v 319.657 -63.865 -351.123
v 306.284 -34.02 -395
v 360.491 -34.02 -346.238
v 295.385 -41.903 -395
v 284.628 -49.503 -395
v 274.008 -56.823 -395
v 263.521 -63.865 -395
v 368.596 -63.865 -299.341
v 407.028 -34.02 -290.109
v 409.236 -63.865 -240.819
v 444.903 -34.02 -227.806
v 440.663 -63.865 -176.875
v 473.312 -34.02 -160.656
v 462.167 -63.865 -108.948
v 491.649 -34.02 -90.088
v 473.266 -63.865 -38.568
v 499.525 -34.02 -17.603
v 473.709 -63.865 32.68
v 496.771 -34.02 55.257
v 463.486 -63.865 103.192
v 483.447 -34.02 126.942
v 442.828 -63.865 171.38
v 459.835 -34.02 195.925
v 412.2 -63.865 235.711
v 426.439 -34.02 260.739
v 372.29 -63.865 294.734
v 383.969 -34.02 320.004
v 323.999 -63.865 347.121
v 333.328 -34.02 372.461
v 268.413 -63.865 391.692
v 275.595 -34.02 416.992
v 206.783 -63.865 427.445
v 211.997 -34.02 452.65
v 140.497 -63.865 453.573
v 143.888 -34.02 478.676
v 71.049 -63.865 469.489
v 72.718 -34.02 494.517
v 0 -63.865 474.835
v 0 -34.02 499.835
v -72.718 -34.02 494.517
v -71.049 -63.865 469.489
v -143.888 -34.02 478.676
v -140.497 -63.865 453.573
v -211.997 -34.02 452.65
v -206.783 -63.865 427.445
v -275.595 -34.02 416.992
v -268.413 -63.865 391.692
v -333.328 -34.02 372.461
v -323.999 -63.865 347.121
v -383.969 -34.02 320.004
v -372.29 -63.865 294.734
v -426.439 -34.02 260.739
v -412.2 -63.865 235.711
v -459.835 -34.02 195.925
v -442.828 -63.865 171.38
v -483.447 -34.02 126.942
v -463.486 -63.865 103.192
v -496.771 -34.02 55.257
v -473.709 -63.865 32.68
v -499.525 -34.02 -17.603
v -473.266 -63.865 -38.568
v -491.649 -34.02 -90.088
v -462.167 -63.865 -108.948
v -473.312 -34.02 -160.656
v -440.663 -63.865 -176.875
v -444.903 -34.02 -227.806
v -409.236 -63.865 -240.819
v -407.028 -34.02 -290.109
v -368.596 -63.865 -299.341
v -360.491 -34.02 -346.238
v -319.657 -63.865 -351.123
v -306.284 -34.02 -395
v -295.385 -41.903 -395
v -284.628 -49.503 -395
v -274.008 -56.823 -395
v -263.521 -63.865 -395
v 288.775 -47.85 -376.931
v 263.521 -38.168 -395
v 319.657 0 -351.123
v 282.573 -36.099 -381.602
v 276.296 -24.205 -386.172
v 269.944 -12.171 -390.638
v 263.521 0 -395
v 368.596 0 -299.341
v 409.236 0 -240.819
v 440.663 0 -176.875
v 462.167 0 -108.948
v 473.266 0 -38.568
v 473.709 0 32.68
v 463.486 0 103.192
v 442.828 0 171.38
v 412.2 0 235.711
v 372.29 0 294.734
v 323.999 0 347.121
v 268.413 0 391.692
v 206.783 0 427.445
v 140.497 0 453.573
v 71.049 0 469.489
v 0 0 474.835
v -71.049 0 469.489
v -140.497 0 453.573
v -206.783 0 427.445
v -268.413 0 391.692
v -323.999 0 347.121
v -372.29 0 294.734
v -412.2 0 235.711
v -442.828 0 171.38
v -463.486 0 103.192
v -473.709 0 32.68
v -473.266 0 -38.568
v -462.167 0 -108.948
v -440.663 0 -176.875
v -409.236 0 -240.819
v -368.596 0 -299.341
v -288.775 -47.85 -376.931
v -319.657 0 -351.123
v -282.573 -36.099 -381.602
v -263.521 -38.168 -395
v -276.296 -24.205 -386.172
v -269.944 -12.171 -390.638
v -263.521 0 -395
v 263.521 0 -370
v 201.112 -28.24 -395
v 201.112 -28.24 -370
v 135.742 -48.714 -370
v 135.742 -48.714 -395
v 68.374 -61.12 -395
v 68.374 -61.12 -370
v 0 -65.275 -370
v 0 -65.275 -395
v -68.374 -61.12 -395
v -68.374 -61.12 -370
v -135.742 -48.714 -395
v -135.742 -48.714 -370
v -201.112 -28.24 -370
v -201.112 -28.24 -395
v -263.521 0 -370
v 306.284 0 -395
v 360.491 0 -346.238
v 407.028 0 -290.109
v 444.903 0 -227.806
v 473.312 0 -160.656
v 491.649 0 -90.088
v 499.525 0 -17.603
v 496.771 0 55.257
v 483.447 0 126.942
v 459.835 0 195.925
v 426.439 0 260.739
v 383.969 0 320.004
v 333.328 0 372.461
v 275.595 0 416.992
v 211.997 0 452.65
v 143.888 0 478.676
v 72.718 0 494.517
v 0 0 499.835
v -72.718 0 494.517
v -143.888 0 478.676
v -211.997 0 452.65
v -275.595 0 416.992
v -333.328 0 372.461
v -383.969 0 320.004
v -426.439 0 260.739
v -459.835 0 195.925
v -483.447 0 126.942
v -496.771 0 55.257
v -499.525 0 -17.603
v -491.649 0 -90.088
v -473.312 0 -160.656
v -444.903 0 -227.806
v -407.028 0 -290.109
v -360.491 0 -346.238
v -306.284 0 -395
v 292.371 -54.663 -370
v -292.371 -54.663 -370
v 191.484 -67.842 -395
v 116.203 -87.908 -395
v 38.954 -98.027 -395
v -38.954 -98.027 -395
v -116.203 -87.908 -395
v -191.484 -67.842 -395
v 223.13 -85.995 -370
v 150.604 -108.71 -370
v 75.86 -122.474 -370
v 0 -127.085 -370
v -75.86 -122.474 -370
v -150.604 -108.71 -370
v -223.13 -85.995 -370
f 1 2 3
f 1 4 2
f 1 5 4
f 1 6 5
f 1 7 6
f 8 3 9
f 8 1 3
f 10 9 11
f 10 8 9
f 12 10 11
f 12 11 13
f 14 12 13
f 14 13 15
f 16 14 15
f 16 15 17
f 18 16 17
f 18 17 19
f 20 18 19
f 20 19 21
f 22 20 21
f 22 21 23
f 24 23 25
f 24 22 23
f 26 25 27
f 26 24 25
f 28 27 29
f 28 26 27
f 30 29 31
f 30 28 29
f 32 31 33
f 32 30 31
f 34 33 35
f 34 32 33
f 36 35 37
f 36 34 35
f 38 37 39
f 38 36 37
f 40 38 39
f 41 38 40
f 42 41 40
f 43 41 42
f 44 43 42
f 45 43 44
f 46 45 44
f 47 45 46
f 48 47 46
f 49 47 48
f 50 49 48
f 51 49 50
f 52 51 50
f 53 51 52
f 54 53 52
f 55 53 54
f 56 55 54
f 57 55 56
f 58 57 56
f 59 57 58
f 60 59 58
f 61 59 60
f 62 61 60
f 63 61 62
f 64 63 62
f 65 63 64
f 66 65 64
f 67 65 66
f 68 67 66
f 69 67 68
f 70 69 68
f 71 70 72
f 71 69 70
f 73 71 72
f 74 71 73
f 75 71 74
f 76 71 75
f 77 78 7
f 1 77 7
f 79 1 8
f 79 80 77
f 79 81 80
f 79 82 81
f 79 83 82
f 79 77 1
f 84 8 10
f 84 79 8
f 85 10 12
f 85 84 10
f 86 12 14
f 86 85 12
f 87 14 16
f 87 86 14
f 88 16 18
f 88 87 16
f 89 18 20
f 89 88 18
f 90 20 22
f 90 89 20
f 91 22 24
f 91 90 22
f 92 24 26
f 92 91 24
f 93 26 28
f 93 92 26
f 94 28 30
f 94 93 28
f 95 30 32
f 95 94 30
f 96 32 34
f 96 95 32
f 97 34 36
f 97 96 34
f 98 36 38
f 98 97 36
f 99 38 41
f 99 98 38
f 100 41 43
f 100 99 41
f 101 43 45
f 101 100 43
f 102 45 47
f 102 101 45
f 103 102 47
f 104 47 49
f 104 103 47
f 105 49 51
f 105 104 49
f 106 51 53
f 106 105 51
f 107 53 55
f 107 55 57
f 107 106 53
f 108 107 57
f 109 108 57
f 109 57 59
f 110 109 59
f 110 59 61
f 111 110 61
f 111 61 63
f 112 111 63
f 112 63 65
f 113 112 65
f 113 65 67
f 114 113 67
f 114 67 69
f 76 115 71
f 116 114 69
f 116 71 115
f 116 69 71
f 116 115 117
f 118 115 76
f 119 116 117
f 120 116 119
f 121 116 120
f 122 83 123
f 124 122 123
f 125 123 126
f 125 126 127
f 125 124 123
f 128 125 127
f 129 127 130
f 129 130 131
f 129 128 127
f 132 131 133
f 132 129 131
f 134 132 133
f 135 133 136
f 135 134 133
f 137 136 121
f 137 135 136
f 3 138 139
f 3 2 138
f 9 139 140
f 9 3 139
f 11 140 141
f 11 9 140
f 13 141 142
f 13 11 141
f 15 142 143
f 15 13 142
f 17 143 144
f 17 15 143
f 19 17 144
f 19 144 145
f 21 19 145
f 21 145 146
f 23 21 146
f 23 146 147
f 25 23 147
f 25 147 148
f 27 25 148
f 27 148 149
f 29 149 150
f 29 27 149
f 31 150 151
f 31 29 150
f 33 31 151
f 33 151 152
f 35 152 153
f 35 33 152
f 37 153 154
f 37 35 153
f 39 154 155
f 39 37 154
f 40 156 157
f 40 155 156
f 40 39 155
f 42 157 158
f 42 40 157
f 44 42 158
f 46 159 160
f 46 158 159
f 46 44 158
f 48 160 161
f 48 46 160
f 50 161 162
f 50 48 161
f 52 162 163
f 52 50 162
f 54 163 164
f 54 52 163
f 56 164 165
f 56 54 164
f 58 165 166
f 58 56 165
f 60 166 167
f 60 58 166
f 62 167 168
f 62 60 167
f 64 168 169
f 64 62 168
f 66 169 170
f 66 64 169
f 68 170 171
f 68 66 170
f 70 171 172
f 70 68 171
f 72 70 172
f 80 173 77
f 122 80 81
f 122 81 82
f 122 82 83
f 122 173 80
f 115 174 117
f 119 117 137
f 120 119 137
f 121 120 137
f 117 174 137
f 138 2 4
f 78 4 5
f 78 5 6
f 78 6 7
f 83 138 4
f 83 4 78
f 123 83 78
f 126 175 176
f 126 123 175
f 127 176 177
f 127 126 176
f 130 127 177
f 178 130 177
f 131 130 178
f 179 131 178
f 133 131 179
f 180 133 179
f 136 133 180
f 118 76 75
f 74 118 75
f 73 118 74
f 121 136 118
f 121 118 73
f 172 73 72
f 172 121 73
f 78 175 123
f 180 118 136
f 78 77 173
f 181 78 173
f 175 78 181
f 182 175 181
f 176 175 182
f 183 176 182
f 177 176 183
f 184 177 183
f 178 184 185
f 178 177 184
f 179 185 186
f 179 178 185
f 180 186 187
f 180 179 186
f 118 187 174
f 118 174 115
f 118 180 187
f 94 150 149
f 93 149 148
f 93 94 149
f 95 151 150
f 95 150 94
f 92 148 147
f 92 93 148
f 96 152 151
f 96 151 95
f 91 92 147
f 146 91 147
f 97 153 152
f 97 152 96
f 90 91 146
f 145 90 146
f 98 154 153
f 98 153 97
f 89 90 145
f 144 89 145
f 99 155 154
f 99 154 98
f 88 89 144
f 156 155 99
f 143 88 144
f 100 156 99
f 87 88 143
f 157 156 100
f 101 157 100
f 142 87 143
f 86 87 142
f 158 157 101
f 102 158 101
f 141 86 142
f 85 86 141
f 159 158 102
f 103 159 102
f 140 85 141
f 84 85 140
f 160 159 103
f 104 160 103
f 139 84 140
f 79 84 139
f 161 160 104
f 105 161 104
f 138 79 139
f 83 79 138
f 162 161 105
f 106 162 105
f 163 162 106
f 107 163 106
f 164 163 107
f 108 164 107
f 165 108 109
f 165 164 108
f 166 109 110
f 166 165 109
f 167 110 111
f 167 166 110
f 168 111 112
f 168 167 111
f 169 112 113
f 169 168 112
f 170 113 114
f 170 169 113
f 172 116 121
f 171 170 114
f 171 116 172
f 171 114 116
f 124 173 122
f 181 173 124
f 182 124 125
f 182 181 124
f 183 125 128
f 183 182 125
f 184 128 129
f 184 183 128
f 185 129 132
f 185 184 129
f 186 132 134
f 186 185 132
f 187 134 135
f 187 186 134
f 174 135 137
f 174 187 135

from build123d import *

# Parameters (mm, degrees)
F3_W     = 673.8248765469
F3_H     = 114.0088248253
F4_DEPTH = 253


with BuildPart() as f2:
    # F1 (on Right) → F2 (revolve)
    with BuildSketch(Plane.YZ):
        Polygon((0, 474.8347821527), (0, 499.8347821527), (-34.02, 499.8347821527), (-63.8654725708, 474.8347821527), align=None)
    revolve(axis=Axis((0, 1.7310532815, 0), (0, -1, 0)))

    # F3 (on Front) → F4 (cut)
    with BuildSketch(Plane.XZ):
        with Locations((0.930711627, -452.0044124126)):
            Rectangle(F3_W, F3_H)
    extrude(amount=F4_DEPTH, mode=Mode.SUBTRACT)

    # F8: sweep along a path in F6
    with BuildLine(Plane.XY.offset(-395)) as f8_path:
        ThreePointArc((263.5205311585, 0), (0, -65.2754158494), (-263.5205311585, 0))
    # F7 (on Right) → F8 (sweep)
    with BuildSketch(Plane.YZ):
        Polygon((-65.2754158494, -395), (-65.2754158494, -370), (-127.0850614031, -370), (-99.2954158494, -395), align=None)
    sweep(path=f8_path.line)


solid = f2.part
